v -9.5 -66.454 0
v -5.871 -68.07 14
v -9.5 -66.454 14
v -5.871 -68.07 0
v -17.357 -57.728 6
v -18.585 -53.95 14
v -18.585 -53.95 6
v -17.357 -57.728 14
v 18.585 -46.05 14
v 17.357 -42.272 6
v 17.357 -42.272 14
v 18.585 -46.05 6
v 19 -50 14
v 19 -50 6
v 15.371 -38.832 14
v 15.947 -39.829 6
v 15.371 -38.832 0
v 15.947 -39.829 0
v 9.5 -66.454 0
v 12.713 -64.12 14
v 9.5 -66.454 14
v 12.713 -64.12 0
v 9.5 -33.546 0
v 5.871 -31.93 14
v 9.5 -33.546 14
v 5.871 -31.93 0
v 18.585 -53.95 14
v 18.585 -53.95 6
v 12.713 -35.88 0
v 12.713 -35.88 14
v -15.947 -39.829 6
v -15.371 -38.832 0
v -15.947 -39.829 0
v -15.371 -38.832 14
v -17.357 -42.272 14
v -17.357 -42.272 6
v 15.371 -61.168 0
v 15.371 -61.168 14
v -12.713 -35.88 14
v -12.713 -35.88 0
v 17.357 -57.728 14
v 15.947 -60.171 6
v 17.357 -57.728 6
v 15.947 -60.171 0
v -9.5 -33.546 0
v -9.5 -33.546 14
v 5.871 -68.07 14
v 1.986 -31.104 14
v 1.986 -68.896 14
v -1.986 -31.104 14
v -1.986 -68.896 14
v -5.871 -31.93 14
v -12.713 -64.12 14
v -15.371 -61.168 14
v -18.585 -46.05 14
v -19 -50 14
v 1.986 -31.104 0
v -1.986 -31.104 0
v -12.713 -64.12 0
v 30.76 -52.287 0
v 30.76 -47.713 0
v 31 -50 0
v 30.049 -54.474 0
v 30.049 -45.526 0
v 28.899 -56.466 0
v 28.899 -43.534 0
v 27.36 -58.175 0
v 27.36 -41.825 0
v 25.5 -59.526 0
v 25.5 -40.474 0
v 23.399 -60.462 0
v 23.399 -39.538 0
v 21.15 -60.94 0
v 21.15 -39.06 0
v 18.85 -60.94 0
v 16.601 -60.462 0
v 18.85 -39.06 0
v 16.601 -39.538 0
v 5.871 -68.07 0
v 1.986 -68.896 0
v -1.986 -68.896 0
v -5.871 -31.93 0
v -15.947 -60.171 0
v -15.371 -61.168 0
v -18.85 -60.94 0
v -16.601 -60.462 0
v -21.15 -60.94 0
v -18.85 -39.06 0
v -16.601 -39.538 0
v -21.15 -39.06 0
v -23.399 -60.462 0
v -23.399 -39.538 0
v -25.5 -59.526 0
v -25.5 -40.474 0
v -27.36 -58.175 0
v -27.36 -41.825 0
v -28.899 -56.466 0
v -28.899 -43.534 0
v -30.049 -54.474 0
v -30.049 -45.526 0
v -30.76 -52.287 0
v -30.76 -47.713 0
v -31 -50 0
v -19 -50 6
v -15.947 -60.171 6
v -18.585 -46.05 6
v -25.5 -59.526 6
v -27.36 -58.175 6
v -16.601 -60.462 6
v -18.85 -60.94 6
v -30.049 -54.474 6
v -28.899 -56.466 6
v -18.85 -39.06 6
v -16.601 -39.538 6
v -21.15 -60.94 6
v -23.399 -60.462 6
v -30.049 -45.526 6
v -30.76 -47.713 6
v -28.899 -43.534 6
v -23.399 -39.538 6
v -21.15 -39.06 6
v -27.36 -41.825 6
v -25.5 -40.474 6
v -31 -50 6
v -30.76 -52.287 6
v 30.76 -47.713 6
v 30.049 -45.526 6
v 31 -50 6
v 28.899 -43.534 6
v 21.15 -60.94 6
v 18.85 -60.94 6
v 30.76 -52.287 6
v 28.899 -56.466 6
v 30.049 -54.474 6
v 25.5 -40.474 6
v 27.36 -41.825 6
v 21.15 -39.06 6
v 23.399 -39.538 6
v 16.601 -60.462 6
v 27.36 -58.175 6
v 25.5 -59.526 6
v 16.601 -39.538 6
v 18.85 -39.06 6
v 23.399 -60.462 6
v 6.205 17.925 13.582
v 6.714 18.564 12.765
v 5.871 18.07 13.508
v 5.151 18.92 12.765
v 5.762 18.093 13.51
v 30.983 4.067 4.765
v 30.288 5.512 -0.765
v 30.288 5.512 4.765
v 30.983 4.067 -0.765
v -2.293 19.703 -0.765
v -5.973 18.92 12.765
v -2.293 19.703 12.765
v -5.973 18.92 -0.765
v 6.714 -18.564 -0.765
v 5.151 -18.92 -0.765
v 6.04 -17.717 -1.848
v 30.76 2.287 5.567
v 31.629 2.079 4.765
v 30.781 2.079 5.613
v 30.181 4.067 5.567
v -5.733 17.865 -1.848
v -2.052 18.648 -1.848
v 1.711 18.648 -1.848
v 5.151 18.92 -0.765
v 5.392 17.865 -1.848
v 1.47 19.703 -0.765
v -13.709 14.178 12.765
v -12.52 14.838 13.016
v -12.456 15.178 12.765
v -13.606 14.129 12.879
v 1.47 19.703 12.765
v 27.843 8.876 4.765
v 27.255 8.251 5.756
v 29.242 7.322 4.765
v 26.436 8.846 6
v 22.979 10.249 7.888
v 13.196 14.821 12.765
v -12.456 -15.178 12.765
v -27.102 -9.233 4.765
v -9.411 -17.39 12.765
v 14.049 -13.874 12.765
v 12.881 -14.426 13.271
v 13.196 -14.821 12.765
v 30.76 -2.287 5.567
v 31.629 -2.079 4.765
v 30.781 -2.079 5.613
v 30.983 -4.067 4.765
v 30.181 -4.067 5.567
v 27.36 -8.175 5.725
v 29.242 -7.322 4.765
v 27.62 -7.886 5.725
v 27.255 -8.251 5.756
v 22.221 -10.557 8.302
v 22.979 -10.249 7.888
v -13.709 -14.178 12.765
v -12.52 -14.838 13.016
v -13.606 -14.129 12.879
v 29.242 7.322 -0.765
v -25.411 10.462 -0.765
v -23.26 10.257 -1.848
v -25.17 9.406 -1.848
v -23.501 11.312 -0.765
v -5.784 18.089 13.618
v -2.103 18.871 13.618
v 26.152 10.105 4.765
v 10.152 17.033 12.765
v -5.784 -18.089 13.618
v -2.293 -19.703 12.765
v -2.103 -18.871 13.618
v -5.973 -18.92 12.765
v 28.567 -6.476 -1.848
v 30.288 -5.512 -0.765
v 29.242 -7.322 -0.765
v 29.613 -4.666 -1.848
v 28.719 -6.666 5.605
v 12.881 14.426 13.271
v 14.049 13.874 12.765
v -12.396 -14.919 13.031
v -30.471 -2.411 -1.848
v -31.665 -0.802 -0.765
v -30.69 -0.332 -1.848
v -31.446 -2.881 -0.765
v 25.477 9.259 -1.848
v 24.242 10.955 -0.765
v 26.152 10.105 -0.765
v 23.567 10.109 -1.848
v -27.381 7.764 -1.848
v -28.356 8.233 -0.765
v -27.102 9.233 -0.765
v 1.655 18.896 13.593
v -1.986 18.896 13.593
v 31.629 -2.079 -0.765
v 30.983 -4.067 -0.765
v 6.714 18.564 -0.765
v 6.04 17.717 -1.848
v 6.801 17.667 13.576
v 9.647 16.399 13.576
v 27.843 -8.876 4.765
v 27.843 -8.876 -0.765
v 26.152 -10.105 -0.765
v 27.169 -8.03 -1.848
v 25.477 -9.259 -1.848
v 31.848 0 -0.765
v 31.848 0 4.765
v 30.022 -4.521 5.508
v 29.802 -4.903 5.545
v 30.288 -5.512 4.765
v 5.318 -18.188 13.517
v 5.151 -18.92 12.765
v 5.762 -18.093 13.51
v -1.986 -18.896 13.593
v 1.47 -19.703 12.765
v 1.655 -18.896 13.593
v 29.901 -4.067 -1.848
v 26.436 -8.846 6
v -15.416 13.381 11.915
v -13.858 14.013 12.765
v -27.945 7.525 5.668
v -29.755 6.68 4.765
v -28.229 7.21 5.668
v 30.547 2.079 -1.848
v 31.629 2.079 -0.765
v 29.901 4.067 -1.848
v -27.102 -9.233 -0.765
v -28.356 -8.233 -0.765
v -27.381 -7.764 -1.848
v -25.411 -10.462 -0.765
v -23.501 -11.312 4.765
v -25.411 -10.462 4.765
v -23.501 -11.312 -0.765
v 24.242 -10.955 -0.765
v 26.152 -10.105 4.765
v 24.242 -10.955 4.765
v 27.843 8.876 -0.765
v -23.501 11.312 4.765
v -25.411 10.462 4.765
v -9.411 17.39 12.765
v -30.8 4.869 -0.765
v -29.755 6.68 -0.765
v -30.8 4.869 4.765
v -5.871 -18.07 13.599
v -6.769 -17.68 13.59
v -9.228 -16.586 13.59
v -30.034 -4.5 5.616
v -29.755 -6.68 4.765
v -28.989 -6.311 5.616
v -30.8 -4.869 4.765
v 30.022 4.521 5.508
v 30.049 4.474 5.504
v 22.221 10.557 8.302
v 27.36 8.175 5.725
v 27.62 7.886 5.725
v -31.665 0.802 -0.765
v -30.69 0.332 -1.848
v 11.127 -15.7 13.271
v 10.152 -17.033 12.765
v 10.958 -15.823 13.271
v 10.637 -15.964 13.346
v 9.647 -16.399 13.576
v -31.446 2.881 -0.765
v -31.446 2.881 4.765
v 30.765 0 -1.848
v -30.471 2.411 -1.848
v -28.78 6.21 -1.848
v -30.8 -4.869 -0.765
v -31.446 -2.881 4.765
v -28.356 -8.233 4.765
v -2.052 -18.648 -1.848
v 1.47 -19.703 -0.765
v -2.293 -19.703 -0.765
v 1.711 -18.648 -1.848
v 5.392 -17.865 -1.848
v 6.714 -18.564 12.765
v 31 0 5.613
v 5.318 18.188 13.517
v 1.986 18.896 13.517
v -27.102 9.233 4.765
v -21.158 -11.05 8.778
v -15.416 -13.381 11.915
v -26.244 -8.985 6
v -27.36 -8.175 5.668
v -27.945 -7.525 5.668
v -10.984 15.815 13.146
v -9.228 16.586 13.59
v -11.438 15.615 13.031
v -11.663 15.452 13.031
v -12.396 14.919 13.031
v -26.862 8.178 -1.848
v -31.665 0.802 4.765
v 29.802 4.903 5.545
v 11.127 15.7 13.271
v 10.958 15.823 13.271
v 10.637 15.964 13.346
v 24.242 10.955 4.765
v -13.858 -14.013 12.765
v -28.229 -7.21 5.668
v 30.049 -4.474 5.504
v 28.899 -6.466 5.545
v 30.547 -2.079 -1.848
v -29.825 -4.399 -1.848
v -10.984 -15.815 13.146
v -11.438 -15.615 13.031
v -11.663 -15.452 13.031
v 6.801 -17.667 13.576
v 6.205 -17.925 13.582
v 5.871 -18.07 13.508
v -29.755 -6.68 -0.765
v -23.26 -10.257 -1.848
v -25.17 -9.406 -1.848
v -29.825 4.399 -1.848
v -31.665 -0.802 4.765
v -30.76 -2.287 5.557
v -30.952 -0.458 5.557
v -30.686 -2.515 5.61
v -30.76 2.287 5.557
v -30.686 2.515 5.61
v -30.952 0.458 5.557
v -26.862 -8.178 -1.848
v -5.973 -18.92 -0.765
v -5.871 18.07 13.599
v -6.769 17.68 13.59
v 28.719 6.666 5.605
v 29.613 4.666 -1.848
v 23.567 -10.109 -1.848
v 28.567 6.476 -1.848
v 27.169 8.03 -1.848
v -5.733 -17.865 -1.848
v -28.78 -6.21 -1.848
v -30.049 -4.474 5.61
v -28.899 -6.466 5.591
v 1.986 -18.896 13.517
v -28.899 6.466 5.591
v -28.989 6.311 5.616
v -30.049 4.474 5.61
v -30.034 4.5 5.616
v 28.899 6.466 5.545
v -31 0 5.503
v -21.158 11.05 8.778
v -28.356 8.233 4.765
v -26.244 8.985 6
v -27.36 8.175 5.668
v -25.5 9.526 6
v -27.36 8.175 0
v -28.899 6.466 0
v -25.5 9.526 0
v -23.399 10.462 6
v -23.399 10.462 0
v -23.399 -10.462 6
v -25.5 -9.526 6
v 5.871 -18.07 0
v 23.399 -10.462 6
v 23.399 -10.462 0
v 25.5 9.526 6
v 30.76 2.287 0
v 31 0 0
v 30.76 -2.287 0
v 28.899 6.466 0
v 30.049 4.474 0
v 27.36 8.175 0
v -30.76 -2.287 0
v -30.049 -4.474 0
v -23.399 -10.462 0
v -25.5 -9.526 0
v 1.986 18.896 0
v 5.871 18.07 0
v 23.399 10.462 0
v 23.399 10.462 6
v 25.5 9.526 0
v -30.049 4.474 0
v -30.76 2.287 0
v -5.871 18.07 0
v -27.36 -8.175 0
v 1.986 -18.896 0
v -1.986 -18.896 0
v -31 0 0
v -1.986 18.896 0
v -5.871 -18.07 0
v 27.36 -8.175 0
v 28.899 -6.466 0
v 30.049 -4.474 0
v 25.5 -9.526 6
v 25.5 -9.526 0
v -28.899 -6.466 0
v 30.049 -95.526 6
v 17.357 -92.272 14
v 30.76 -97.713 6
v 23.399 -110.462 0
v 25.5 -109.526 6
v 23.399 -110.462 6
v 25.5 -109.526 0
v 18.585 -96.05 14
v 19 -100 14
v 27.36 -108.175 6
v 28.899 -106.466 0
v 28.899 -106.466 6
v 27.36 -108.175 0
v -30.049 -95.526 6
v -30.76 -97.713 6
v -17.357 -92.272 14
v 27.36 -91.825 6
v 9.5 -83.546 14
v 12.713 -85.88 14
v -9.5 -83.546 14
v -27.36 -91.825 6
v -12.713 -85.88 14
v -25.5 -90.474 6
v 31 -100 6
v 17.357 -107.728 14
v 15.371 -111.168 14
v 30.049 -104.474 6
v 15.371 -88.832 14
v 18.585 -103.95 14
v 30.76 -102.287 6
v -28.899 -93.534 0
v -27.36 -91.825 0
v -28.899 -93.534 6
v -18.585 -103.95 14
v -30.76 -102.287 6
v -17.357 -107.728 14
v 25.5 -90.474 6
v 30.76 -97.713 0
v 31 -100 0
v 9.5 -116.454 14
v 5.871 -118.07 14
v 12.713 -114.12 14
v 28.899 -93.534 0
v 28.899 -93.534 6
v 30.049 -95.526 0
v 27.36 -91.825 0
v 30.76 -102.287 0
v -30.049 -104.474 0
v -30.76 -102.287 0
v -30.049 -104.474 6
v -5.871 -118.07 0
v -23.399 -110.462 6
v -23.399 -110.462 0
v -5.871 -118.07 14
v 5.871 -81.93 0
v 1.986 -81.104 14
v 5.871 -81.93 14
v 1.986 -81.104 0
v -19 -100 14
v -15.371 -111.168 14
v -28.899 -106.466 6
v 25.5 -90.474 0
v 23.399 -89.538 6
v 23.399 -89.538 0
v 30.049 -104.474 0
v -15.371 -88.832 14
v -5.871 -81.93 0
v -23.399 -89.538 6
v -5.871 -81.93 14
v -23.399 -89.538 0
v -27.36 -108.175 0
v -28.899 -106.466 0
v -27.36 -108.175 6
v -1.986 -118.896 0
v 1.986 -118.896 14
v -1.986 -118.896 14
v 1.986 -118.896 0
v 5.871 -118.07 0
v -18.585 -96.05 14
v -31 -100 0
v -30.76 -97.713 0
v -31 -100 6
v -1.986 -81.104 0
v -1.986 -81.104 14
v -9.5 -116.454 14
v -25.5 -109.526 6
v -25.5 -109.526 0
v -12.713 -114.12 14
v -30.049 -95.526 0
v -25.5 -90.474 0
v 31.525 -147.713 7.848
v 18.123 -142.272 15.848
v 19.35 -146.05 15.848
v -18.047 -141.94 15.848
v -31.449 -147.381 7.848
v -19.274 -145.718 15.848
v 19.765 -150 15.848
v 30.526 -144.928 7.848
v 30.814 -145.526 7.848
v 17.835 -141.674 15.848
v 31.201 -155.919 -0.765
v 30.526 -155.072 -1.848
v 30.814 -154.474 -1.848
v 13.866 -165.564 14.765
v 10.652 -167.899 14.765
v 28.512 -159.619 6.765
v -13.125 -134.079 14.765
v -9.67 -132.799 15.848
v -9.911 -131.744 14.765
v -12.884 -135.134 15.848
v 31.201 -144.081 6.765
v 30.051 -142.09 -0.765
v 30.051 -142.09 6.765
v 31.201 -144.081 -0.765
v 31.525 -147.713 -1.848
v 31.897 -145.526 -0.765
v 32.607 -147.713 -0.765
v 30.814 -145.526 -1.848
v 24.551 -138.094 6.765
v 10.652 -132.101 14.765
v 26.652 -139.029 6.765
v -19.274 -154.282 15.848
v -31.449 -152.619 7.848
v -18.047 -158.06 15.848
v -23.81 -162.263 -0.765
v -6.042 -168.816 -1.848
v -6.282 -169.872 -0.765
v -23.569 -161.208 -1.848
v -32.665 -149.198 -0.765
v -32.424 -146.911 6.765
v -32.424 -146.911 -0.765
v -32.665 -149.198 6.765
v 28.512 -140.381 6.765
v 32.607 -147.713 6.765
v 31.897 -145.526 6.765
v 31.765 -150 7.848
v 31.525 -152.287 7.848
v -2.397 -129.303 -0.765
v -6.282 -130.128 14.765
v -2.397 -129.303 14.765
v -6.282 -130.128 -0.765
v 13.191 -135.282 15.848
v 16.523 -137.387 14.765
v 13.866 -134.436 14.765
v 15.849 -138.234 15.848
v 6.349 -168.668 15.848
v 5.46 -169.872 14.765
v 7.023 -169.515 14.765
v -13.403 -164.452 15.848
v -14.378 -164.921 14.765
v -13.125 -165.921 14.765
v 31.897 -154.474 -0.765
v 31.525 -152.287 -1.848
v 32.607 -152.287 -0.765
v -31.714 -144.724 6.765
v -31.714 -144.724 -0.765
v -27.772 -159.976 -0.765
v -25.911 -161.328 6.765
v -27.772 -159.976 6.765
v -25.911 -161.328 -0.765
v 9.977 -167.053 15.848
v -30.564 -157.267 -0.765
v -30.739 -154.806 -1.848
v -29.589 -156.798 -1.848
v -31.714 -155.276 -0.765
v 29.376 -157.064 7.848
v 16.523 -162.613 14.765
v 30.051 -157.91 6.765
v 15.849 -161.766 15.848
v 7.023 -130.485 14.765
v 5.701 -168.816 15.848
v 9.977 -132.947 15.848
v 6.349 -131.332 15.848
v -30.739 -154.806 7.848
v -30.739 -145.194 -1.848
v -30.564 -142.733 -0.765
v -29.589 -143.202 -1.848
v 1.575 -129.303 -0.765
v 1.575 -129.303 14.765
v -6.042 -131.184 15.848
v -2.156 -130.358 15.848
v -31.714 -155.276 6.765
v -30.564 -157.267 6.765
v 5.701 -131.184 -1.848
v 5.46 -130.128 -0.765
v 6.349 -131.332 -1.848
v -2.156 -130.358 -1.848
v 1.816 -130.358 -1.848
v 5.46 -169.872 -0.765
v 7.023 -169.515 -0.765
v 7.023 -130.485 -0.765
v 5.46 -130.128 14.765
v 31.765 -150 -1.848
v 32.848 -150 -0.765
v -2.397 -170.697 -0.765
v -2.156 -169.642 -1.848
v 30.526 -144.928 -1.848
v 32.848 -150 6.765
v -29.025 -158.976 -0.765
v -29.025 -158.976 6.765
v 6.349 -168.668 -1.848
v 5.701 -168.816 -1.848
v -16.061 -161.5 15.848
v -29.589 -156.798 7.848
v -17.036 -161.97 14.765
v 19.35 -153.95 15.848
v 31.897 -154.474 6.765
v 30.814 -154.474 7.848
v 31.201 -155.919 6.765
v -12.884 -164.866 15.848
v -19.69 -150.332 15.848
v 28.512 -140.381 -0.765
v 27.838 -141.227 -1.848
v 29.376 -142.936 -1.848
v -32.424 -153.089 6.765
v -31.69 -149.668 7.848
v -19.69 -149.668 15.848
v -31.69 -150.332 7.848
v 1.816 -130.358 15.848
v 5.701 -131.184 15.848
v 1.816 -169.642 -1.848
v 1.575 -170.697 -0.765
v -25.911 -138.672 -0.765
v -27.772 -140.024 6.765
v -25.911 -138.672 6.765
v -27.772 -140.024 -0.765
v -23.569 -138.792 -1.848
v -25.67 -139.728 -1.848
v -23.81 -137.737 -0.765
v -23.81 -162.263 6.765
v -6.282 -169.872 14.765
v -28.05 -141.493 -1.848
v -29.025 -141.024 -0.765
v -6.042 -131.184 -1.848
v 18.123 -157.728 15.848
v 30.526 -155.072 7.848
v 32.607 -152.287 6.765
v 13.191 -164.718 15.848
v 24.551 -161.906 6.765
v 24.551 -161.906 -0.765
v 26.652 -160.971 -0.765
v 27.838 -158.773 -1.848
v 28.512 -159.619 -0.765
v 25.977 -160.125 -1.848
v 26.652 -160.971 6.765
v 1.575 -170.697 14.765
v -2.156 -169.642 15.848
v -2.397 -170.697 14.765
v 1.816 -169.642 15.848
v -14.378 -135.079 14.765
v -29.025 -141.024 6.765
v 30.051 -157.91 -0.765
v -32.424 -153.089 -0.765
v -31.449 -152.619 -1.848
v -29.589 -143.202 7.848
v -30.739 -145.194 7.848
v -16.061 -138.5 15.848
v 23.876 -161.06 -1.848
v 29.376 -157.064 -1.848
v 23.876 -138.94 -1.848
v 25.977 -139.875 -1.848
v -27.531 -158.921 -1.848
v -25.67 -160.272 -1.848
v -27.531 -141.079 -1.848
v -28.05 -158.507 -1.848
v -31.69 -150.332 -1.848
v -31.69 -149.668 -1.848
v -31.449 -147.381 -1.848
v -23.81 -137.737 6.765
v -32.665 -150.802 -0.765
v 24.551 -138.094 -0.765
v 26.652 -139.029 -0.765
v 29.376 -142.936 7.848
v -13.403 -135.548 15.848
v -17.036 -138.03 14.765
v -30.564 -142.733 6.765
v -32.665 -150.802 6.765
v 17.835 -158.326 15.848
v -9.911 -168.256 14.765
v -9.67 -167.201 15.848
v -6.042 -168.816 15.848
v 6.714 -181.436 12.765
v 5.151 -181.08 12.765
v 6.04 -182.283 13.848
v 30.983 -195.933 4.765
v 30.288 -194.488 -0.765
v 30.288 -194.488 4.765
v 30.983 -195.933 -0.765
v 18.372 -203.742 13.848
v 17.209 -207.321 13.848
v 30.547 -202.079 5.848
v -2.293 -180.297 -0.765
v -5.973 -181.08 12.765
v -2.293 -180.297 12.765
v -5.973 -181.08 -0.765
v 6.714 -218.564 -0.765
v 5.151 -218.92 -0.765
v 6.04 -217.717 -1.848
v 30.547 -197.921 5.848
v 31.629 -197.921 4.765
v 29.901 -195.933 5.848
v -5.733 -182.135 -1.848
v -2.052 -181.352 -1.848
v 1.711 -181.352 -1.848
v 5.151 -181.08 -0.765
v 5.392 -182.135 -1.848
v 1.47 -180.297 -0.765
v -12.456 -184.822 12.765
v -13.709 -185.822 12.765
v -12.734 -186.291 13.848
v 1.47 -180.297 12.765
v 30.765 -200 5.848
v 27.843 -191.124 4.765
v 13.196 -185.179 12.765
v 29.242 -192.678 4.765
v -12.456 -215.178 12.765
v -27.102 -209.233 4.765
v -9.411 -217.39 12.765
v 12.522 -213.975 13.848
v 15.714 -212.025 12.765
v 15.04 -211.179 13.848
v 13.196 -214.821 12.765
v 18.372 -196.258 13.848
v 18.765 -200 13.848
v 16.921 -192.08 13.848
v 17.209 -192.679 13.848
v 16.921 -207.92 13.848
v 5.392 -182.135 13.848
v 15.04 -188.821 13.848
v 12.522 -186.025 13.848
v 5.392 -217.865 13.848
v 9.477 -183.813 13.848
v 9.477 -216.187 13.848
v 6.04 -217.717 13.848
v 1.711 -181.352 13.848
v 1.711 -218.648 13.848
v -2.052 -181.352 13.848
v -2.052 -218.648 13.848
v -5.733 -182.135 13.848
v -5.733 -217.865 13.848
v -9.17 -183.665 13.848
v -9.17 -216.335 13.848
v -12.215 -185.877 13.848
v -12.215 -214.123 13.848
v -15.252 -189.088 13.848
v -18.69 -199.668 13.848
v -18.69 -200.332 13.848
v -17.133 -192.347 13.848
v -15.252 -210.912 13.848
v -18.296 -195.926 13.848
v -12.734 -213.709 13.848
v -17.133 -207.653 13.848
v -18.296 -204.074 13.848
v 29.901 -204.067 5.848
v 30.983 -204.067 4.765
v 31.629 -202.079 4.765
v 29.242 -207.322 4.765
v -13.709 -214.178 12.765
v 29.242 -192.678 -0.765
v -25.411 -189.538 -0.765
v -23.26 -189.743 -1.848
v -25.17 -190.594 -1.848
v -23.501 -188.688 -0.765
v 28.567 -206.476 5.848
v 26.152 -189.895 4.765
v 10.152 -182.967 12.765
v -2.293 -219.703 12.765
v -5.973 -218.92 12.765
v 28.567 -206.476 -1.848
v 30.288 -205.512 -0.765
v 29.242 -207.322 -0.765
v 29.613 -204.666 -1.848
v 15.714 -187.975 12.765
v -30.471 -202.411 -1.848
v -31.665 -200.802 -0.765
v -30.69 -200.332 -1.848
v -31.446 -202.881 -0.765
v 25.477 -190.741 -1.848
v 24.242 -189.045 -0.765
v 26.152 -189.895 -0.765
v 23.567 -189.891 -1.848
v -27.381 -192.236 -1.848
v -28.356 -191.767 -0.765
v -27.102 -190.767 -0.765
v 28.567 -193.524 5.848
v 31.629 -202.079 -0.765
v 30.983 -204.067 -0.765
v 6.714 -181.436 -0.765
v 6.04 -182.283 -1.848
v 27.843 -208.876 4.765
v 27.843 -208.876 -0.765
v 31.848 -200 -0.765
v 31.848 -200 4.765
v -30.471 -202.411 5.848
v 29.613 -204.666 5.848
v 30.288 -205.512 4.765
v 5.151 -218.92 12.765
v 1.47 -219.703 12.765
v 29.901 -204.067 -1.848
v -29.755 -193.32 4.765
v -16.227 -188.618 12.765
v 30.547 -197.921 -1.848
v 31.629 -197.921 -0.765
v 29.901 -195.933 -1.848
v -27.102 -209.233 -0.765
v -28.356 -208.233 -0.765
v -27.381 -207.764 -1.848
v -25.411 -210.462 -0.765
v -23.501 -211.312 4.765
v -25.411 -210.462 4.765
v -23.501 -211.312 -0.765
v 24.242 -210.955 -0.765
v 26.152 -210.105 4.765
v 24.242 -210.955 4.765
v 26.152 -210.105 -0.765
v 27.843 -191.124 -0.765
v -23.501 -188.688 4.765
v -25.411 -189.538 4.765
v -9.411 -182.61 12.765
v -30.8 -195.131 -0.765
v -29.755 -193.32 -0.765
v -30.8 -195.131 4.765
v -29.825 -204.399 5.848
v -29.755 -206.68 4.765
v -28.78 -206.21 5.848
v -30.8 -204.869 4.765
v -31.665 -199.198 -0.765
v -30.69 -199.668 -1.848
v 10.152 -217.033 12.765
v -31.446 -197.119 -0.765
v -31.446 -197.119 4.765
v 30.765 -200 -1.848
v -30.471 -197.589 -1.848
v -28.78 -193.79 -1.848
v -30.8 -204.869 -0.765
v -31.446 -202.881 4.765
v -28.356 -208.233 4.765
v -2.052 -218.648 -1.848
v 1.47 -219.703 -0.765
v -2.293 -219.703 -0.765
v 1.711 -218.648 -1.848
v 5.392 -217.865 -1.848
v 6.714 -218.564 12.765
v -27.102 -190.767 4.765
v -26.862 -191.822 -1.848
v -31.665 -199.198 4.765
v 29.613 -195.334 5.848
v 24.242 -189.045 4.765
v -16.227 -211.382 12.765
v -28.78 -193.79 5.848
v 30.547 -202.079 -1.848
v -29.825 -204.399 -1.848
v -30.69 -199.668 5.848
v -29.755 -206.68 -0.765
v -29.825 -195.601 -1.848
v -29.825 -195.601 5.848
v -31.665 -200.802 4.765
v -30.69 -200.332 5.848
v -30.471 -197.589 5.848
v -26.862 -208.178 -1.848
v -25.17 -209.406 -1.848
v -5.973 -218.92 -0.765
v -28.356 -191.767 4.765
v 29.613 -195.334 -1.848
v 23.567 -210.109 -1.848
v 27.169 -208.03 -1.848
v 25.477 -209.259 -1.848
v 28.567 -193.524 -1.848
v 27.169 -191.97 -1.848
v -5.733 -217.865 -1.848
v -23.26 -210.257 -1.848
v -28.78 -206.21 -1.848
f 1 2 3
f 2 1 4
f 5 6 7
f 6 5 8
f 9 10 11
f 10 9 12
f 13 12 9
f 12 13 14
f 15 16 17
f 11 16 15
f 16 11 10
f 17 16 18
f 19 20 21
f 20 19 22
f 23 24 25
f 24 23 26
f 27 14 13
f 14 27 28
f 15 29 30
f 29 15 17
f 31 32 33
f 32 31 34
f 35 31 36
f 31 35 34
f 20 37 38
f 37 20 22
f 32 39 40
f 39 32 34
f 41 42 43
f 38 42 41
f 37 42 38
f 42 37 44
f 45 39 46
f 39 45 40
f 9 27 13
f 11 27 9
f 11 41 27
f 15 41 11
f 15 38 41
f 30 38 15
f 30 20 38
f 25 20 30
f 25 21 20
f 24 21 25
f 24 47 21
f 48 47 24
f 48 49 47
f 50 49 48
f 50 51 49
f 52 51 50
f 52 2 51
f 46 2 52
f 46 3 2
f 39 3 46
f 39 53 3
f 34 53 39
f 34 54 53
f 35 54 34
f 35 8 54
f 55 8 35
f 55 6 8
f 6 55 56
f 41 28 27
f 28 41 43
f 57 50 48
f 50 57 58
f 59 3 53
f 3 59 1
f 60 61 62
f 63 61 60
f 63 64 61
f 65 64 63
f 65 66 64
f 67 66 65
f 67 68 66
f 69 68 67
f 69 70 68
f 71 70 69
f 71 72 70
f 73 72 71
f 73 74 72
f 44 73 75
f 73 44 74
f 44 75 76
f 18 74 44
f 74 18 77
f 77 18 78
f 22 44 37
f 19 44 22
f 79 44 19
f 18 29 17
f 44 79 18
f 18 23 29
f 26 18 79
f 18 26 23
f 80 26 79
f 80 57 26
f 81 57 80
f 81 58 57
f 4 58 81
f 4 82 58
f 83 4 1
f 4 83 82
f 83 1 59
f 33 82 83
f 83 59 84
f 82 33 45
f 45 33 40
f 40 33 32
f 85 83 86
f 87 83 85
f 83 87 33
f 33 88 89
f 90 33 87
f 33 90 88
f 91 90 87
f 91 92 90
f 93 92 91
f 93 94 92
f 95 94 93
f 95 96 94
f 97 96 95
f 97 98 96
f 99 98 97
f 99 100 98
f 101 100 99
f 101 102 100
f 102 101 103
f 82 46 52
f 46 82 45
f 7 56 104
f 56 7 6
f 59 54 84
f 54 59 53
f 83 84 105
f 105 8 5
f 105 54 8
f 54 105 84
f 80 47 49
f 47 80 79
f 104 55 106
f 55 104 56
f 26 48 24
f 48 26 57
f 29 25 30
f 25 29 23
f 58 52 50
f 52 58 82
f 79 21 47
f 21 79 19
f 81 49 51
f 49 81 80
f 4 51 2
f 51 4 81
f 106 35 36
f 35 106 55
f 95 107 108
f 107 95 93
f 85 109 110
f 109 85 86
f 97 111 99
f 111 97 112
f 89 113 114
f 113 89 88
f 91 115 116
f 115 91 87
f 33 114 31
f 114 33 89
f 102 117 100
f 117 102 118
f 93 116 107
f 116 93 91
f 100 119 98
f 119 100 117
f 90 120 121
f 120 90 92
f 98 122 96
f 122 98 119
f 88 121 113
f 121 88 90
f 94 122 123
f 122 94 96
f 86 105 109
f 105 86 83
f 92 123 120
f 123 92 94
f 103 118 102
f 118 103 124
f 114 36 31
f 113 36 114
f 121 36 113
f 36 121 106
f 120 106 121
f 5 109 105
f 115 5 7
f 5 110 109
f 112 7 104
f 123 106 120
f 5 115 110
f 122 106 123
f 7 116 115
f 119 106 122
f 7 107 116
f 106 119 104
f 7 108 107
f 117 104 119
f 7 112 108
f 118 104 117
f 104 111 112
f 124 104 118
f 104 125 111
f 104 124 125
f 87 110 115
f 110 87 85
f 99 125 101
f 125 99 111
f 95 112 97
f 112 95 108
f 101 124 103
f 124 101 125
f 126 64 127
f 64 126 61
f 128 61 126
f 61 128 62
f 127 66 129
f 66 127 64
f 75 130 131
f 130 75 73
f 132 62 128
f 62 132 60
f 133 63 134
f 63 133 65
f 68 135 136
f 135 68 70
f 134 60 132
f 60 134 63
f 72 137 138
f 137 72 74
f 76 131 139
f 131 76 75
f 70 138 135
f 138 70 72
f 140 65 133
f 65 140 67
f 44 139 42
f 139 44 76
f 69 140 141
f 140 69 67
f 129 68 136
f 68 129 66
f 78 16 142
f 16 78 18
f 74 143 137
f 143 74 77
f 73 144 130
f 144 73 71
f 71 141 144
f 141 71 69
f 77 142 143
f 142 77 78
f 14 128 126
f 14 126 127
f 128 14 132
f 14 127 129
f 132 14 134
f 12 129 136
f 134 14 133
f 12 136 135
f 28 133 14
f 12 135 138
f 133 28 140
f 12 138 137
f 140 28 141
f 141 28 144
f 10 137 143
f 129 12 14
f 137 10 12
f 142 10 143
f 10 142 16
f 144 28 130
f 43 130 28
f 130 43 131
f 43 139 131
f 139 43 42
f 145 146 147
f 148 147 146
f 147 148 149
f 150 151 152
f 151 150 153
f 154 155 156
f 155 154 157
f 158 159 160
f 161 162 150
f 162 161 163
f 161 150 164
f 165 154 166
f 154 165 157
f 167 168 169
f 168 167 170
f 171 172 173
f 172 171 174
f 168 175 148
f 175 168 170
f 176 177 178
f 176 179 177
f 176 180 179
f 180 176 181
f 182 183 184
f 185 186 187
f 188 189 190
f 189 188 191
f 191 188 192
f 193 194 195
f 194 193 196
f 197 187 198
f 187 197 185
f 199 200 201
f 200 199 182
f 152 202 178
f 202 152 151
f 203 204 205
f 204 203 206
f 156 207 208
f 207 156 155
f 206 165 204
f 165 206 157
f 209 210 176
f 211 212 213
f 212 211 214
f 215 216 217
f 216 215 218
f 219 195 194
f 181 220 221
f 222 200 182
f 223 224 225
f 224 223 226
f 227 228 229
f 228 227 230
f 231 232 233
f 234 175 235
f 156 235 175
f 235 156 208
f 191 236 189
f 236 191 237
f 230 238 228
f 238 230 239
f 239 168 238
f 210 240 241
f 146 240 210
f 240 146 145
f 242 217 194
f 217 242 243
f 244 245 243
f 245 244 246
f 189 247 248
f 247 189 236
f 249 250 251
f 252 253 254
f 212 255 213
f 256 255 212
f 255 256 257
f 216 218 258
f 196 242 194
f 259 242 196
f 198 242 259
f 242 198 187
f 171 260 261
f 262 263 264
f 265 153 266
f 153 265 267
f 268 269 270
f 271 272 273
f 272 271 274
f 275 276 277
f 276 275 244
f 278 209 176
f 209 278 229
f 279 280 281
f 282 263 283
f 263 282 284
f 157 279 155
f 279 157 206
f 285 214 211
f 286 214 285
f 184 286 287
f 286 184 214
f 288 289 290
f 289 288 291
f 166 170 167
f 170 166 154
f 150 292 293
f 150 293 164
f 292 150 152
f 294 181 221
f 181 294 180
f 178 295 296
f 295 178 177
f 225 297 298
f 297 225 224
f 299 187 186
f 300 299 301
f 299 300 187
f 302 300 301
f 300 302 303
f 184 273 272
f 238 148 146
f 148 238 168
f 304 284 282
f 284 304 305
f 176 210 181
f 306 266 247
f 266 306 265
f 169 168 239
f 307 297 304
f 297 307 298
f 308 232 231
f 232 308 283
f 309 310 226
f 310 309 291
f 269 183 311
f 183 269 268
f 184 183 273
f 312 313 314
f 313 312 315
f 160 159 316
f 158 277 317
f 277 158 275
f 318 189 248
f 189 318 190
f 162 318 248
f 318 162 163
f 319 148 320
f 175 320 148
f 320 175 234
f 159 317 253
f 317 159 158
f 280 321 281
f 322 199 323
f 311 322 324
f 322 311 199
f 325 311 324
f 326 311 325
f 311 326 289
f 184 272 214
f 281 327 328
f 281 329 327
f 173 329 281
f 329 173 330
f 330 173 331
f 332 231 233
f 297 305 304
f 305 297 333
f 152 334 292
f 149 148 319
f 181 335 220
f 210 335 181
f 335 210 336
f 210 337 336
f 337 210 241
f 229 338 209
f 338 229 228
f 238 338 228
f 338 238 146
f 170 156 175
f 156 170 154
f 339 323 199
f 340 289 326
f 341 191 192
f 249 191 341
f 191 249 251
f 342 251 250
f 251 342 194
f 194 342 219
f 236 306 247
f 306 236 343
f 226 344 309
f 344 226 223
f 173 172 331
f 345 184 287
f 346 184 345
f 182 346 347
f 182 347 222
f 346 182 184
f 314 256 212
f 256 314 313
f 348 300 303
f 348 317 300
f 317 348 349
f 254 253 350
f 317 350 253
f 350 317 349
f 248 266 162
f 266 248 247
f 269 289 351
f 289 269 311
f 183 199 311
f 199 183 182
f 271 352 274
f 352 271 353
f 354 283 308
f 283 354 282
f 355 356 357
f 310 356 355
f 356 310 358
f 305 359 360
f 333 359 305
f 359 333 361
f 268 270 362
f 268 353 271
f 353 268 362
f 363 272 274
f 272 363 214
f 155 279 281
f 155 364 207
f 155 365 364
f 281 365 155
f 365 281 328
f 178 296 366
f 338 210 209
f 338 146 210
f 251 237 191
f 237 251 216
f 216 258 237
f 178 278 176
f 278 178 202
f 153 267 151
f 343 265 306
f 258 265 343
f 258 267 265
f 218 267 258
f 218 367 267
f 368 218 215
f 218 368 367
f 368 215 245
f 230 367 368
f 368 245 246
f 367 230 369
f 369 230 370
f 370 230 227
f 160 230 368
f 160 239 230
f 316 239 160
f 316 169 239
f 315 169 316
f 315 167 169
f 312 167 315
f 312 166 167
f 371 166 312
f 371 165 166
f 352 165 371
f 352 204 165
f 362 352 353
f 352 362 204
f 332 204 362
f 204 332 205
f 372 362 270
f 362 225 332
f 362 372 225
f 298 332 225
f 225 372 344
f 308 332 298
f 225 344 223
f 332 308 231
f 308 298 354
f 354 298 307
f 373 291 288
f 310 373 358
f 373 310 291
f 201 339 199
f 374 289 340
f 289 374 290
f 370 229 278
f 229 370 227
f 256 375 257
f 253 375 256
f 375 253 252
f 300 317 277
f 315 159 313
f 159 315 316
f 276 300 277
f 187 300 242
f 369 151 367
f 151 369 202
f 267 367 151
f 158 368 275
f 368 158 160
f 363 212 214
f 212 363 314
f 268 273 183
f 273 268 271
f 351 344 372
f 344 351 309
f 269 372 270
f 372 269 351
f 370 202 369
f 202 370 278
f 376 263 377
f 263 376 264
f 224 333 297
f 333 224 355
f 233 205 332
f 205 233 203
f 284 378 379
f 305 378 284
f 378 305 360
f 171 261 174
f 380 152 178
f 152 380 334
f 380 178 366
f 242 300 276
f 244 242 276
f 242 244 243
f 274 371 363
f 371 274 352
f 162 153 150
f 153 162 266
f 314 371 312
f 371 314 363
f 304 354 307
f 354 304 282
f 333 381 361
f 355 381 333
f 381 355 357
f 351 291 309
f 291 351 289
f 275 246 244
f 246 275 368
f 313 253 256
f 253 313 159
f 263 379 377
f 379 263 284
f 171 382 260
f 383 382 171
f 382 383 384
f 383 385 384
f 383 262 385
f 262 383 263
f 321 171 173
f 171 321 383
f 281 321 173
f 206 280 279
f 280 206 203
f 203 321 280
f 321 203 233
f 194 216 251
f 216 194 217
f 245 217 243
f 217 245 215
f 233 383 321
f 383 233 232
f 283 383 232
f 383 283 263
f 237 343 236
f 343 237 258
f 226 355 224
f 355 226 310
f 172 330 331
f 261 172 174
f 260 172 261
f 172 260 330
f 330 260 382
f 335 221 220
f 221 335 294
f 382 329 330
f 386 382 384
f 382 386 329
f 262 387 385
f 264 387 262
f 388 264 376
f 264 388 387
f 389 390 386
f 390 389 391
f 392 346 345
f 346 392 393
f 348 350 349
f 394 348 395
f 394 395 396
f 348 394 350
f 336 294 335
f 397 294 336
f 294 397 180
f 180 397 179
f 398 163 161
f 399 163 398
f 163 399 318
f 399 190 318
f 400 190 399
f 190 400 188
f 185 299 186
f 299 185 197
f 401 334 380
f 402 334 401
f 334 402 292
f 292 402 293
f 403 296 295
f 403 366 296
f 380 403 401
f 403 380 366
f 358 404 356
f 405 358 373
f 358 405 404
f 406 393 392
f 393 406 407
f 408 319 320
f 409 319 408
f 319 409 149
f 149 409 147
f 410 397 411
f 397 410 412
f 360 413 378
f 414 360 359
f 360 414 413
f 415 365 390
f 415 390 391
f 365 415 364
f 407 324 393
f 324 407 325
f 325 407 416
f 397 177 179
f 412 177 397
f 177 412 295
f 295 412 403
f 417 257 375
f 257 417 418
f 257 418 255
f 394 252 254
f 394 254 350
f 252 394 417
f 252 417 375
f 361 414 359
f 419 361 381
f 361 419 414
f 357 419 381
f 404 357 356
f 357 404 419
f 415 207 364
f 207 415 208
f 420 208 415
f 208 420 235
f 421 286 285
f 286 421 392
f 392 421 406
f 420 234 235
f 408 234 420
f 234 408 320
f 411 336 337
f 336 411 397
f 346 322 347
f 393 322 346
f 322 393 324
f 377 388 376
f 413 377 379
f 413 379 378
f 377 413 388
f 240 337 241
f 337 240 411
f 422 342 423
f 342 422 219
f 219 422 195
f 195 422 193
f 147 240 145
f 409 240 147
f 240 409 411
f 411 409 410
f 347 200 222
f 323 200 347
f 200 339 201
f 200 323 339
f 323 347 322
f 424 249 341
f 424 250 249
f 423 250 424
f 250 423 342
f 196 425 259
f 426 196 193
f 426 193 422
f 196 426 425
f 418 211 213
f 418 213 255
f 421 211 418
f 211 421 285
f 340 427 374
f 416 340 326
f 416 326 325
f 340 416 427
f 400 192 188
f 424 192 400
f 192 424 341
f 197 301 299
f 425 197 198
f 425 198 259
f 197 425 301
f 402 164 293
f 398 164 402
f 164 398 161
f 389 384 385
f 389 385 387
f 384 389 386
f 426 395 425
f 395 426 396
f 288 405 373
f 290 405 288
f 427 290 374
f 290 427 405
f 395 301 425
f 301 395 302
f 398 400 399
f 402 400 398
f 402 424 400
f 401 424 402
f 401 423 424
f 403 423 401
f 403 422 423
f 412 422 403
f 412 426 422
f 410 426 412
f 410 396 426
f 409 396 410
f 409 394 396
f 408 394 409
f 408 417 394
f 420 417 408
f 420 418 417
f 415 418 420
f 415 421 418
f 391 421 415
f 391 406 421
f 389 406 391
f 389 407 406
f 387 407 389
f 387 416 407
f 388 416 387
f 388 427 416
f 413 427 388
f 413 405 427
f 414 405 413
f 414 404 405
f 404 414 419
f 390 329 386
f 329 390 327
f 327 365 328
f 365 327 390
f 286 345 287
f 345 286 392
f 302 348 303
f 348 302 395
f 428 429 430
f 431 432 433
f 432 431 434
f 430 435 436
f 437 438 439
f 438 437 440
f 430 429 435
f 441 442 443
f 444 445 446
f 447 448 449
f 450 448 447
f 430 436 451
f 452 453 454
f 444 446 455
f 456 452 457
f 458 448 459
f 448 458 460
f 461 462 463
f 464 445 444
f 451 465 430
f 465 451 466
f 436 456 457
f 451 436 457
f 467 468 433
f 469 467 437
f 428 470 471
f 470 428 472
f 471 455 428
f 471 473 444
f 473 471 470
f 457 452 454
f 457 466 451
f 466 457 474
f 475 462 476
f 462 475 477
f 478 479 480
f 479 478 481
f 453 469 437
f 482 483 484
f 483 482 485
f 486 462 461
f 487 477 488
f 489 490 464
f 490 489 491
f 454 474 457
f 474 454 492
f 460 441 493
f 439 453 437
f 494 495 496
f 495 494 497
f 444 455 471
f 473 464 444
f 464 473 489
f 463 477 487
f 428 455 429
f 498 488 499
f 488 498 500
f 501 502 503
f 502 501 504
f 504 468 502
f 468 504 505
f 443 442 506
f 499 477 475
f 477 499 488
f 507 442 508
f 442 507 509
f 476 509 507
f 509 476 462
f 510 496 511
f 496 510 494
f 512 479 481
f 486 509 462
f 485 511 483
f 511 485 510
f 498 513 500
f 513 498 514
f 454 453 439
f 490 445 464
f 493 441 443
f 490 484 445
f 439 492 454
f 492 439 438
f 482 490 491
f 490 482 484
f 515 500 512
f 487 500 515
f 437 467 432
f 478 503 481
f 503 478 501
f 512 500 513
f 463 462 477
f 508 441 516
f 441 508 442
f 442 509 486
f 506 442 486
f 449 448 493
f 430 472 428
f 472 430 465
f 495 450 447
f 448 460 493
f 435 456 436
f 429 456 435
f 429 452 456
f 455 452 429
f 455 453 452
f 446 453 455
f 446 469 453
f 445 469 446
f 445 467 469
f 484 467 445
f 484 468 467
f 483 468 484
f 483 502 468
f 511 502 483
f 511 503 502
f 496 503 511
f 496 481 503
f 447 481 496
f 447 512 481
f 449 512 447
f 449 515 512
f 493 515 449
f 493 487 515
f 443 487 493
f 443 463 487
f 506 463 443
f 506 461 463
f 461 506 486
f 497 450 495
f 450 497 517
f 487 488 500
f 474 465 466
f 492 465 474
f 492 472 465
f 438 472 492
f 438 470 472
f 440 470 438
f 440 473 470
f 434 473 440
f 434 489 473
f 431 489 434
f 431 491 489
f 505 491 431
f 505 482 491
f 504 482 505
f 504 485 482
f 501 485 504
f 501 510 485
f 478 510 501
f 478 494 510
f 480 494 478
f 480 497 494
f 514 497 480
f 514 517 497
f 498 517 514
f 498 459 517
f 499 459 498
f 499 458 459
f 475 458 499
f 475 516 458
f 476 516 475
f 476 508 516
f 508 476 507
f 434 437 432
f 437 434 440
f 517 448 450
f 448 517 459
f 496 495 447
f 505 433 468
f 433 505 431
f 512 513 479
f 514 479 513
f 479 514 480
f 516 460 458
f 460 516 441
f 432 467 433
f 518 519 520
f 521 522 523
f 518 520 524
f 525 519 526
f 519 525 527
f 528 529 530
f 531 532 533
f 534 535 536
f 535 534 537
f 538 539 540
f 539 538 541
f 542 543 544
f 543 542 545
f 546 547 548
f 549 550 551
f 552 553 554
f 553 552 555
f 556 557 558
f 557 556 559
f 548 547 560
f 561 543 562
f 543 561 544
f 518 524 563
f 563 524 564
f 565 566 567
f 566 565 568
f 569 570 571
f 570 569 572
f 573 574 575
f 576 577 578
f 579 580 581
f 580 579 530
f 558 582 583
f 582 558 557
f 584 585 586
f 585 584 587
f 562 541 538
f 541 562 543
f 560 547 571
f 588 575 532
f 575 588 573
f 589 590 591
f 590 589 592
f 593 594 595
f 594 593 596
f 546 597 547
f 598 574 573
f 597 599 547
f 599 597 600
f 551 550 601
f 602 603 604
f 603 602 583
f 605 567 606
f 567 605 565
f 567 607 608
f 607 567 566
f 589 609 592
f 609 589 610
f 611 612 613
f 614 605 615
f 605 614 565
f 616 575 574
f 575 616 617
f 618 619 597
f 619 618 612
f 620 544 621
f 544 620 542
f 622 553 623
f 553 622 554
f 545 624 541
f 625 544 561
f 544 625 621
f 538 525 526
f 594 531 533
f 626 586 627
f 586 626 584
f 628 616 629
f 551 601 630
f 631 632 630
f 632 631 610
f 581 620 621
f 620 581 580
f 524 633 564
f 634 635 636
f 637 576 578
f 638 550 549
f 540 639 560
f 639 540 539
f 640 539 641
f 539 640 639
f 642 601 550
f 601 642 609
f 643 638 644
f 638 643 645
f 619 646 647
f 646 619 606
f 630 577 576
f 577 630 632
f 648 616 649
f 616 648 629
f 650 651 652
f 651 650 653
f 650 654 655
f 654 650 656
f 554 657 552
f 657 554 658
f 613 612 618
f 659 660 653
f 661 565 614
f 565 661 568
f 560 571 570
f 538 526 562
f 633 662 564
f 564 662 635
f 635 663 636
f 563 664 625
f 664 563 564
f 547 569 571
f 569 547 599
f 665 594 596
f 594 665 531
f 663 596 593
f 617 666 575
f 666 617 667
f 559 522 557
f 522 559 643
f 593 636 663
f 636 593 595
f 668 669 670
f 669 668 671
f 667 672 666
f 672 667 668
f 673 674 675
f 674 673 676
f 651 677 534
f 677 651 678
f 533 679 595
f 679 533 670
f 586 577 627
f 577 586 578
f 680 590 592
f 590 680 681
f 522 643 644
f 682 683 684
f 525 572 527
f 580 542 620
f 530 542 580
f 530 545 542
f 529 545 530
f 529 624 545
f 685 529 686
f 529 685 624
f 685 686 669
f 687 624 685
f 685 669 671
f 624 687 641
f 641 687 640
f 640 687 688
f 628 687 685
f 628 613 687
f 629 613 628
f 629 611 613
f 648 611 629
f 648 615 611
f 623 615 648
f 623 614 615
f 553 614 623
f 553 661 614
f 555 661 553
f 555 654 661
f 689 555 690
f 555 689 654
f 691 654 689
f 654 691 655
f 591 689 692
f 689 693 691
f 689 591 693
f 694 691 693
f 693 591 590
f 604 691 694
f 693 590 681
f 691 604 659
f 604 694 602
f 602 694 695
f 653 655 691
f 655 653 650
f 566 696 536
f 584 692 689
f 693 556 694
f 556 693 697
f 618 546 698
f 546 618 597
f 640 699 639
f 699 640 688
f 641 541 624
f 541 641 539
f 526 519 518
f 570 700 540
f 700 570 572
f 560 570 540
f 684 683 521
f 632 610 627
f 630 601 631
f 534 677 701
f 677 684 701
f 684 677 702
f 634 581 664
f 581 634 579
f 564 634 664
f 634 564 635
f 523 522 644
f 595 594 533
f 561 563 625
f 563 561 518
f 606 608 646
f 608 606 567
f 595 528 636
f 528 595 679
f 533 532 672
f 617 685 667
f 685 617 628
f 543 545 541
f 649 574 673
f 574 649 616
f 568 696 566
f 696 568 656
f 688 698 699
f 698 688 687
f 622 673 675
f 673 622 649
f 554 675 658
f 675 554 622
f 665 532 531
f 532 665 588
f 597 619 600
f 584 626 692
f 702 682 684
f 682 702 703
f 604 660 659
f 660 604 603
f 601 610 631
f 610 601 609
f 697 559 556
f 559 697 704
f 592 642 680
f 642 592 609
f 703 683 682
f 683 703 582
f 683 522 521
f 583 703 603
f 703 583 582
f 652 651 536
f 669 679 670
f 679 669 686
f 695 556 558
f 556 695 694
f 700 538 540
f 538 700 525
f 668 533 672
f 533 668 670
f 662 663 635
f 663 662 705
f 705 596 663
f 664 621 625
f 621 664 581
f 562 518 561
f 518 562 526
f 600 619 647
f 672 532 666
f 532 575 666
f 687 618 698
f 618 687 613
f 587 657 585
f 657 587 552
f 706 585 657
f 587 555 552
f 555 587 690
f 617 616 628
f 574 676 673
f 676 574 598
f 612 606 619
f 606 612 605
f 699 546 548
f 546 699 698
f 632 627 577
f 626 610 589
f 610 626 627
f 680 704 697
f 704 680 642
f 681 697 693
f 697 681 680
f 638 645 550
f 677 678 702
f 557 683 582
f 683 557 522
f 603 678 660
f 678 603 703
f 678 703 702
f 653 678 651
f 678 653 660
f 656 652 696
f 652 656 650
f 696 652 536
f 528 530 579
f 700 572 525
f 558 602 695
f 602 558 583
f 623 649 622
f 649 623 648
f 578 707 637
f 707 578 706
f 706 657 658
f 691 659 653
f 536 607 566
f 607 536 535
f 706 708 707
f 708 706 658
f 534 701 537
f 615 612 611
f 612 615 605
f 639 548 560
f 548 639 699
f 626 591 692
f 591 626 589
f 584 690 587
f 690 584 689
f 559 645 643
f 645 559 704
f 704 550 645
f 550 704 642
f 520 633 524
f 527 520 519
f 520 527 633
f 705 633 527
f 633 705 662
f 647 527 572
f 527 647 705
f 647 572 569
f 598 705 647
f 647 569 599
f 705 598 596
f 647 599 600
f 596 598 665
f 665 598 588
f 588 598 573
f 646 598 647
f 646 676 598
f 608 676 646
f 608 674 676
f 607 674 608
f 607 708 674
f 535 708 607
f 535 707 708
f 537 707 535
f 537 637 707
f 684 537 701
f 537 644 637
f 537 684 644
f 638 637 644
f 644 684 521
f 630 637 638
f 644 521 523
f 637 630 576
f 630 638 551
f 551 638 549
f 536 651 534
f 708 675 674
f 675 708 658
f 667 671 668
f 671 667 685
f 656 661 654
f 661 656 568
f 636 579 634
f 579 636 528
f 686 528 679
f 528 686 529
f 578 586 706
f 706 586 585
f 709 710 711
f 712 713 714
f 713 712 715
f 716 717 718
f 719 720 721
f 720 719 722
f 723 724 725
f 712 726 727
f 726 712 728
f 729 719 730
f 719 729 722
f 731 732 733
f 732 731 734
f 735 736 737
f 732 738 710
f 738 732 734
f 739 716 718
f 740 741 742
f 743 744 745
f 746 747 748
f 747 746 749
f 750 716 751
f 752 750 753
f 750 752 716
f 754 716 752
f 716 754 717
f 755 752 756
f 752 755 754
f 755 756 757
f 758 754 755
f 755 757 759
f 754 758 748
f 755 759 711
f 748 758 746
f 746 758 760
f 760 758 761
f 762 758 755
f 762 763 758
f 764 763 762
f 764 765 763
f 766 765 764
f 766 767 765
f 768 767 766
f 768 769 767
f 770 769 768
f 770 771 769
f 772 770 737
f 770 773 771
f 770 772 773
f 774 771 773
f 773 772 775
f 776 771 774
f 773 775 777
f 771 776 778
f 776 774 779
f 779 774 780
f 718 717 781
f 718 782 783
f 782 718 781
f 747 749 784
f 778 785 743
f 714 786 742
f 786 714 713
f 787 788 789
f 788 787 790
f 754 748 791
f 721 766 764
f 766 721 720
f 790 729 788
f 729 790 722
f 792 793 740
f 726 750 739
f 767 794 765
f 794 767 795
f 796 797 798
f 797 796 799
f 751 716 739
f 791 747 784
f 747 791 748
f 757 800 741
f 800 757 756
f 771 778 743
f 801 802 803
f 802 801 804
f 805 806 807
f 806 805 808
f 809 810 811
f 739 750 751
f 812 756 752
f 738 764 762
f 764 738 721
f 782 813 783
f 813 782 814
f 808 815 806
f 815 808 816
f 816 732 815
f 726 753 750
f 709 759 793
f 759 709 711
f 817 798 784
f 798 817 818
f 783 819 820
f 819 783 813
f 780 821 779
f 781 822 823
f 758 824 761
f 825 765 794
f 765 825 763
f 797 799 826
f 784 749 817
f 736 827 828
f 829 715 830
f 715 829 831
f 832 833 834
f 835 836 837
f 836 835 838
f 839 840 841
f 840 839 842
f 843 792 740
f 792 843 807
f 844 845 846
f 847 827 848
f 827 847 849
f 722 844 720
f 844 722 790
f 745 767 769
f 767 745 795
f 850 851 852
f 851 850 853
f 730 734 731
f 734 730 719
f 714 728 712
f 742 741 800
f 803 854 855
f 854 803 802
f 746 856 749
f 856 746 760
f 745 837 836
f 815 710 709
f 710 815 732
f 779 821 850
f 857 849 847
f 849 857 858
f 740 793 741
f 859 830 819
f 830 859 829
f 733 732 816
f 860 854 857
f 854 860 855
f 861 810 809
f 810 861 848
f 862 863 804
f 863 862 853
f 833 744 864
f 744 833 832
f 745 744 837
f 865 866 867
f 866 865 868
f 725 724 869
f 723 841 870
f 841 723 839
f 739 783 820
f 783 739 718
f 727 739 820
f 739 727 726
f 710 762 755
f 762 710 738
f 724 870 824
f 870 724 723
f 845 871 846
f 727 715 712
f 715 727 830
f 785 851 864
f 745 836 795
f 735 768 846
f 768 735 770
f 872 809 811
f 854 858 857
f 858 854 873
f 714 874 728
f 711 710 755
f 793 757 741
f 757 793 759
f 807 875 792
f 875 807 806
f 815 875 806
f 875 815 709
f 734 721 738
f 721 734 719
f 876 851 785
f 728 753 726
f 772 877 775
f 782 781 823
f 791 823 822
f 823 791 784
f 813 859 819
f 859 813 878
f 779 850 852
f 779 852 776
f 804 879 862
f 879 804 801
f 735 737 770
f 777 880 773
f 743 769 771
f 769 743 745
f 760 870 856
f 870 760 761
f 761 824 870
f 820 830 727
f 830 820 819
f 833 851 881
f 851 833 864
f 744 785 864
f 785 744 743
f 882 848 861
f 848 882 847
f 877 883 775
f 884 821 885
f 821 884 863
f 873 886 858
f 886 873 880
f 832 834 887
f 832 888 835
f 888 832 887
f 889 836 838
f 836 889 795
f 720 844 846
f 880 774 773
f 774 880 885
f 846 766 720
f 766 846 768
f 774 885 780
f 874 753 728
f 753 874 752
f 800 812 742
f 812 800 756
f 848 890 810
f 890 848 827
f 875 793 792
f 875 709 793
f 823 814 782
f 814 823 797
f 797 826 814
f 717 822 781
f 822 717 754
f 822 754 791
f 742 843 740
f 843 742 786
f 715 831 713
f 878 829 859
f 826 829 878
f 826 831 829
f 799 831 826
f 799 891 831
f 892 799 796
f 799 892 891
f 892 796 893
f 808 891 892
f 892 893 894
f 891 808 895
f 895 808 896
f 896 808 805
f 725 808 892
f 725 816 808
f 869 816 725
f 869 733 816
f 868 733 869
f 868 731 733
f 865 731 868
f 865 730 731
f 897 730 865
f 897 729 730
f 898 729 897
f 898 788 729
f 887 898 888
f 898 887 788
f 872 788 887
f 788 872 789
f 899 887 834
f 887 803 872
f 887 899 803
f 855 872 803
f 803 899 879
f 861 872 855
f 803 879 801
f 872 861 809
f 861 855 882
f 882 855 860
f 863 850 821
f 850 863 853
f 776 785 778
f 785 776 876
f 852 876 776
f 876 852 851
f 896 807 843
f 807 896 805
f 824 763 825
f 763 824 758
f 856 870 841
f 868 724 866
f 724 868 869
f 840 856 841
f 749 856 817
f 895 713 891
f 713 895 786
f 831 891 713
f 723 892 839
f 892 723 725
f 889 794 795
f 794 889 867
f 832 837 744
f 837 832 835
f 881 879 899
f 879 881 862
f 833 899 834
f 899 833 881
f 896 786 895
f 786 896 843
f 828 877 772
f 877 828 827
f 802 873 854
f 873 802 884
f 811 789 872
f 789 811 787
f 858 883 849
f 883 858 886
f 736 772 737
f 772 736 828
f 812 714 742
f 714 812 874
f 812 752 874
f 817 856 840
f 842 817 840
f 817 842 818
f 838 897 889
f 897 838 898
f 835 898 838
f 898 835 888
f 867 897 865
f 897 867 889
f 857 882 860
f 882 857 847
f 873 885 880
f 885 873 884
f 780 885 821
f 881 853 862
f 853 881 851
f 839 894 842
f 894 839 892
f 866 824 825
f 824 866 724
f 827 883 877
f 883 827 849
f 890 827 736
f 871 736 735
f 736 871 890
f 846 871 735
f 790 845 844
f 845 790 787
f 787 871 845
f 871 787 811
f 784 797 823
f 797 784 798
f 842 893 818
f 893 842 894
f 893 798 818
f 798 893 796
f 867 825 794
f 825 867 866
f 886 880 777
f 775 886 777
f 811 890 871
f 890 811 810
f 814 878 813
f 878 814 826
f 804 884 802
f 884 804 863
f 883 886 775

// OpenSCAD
module t1() {
    cylinder(d=38,h=14);
}
module t2() {
    cylinder(d=38,h=14);
    translate([-20,0,0]) cylinder(d=22,6);
    translate([20,0,0]) cylinder(d=22,6);
}
module t3() {
    hull() {
        cylinder(d=38,h=14);
        translate([-20,0,0]) cylinder(d=22,6);
        translate([20,0,0]) cylinder(d=22,6);
    }
}

module t4() {
    minkowski() {
        sphere(2);
        hull() {
            cylinder(d=38,h=14);
            translate([-20,0,0]) cylinder(d=22,6);
            translate([20,0,0]) cylinder(d=22,6);
        }
    }
}

module t5() {
    round=2;
    minkowski() {
        sphere(round);
        hull() {
            cylinder(d=38-round,h=14-round);
            translate([-20,0,0]) cylinder(d=22-round,6-round);
            translate([20,0,0]) cylinder(d=22-round,6-round);
        }
    }
}


// t1();
translate([0,-50,0]) t2();
translate([0,-100,0]) t3();
translate([0,-150,0]) t4();
translate([0,-200,0]) t5();

difference() { t5(); t3(); }
